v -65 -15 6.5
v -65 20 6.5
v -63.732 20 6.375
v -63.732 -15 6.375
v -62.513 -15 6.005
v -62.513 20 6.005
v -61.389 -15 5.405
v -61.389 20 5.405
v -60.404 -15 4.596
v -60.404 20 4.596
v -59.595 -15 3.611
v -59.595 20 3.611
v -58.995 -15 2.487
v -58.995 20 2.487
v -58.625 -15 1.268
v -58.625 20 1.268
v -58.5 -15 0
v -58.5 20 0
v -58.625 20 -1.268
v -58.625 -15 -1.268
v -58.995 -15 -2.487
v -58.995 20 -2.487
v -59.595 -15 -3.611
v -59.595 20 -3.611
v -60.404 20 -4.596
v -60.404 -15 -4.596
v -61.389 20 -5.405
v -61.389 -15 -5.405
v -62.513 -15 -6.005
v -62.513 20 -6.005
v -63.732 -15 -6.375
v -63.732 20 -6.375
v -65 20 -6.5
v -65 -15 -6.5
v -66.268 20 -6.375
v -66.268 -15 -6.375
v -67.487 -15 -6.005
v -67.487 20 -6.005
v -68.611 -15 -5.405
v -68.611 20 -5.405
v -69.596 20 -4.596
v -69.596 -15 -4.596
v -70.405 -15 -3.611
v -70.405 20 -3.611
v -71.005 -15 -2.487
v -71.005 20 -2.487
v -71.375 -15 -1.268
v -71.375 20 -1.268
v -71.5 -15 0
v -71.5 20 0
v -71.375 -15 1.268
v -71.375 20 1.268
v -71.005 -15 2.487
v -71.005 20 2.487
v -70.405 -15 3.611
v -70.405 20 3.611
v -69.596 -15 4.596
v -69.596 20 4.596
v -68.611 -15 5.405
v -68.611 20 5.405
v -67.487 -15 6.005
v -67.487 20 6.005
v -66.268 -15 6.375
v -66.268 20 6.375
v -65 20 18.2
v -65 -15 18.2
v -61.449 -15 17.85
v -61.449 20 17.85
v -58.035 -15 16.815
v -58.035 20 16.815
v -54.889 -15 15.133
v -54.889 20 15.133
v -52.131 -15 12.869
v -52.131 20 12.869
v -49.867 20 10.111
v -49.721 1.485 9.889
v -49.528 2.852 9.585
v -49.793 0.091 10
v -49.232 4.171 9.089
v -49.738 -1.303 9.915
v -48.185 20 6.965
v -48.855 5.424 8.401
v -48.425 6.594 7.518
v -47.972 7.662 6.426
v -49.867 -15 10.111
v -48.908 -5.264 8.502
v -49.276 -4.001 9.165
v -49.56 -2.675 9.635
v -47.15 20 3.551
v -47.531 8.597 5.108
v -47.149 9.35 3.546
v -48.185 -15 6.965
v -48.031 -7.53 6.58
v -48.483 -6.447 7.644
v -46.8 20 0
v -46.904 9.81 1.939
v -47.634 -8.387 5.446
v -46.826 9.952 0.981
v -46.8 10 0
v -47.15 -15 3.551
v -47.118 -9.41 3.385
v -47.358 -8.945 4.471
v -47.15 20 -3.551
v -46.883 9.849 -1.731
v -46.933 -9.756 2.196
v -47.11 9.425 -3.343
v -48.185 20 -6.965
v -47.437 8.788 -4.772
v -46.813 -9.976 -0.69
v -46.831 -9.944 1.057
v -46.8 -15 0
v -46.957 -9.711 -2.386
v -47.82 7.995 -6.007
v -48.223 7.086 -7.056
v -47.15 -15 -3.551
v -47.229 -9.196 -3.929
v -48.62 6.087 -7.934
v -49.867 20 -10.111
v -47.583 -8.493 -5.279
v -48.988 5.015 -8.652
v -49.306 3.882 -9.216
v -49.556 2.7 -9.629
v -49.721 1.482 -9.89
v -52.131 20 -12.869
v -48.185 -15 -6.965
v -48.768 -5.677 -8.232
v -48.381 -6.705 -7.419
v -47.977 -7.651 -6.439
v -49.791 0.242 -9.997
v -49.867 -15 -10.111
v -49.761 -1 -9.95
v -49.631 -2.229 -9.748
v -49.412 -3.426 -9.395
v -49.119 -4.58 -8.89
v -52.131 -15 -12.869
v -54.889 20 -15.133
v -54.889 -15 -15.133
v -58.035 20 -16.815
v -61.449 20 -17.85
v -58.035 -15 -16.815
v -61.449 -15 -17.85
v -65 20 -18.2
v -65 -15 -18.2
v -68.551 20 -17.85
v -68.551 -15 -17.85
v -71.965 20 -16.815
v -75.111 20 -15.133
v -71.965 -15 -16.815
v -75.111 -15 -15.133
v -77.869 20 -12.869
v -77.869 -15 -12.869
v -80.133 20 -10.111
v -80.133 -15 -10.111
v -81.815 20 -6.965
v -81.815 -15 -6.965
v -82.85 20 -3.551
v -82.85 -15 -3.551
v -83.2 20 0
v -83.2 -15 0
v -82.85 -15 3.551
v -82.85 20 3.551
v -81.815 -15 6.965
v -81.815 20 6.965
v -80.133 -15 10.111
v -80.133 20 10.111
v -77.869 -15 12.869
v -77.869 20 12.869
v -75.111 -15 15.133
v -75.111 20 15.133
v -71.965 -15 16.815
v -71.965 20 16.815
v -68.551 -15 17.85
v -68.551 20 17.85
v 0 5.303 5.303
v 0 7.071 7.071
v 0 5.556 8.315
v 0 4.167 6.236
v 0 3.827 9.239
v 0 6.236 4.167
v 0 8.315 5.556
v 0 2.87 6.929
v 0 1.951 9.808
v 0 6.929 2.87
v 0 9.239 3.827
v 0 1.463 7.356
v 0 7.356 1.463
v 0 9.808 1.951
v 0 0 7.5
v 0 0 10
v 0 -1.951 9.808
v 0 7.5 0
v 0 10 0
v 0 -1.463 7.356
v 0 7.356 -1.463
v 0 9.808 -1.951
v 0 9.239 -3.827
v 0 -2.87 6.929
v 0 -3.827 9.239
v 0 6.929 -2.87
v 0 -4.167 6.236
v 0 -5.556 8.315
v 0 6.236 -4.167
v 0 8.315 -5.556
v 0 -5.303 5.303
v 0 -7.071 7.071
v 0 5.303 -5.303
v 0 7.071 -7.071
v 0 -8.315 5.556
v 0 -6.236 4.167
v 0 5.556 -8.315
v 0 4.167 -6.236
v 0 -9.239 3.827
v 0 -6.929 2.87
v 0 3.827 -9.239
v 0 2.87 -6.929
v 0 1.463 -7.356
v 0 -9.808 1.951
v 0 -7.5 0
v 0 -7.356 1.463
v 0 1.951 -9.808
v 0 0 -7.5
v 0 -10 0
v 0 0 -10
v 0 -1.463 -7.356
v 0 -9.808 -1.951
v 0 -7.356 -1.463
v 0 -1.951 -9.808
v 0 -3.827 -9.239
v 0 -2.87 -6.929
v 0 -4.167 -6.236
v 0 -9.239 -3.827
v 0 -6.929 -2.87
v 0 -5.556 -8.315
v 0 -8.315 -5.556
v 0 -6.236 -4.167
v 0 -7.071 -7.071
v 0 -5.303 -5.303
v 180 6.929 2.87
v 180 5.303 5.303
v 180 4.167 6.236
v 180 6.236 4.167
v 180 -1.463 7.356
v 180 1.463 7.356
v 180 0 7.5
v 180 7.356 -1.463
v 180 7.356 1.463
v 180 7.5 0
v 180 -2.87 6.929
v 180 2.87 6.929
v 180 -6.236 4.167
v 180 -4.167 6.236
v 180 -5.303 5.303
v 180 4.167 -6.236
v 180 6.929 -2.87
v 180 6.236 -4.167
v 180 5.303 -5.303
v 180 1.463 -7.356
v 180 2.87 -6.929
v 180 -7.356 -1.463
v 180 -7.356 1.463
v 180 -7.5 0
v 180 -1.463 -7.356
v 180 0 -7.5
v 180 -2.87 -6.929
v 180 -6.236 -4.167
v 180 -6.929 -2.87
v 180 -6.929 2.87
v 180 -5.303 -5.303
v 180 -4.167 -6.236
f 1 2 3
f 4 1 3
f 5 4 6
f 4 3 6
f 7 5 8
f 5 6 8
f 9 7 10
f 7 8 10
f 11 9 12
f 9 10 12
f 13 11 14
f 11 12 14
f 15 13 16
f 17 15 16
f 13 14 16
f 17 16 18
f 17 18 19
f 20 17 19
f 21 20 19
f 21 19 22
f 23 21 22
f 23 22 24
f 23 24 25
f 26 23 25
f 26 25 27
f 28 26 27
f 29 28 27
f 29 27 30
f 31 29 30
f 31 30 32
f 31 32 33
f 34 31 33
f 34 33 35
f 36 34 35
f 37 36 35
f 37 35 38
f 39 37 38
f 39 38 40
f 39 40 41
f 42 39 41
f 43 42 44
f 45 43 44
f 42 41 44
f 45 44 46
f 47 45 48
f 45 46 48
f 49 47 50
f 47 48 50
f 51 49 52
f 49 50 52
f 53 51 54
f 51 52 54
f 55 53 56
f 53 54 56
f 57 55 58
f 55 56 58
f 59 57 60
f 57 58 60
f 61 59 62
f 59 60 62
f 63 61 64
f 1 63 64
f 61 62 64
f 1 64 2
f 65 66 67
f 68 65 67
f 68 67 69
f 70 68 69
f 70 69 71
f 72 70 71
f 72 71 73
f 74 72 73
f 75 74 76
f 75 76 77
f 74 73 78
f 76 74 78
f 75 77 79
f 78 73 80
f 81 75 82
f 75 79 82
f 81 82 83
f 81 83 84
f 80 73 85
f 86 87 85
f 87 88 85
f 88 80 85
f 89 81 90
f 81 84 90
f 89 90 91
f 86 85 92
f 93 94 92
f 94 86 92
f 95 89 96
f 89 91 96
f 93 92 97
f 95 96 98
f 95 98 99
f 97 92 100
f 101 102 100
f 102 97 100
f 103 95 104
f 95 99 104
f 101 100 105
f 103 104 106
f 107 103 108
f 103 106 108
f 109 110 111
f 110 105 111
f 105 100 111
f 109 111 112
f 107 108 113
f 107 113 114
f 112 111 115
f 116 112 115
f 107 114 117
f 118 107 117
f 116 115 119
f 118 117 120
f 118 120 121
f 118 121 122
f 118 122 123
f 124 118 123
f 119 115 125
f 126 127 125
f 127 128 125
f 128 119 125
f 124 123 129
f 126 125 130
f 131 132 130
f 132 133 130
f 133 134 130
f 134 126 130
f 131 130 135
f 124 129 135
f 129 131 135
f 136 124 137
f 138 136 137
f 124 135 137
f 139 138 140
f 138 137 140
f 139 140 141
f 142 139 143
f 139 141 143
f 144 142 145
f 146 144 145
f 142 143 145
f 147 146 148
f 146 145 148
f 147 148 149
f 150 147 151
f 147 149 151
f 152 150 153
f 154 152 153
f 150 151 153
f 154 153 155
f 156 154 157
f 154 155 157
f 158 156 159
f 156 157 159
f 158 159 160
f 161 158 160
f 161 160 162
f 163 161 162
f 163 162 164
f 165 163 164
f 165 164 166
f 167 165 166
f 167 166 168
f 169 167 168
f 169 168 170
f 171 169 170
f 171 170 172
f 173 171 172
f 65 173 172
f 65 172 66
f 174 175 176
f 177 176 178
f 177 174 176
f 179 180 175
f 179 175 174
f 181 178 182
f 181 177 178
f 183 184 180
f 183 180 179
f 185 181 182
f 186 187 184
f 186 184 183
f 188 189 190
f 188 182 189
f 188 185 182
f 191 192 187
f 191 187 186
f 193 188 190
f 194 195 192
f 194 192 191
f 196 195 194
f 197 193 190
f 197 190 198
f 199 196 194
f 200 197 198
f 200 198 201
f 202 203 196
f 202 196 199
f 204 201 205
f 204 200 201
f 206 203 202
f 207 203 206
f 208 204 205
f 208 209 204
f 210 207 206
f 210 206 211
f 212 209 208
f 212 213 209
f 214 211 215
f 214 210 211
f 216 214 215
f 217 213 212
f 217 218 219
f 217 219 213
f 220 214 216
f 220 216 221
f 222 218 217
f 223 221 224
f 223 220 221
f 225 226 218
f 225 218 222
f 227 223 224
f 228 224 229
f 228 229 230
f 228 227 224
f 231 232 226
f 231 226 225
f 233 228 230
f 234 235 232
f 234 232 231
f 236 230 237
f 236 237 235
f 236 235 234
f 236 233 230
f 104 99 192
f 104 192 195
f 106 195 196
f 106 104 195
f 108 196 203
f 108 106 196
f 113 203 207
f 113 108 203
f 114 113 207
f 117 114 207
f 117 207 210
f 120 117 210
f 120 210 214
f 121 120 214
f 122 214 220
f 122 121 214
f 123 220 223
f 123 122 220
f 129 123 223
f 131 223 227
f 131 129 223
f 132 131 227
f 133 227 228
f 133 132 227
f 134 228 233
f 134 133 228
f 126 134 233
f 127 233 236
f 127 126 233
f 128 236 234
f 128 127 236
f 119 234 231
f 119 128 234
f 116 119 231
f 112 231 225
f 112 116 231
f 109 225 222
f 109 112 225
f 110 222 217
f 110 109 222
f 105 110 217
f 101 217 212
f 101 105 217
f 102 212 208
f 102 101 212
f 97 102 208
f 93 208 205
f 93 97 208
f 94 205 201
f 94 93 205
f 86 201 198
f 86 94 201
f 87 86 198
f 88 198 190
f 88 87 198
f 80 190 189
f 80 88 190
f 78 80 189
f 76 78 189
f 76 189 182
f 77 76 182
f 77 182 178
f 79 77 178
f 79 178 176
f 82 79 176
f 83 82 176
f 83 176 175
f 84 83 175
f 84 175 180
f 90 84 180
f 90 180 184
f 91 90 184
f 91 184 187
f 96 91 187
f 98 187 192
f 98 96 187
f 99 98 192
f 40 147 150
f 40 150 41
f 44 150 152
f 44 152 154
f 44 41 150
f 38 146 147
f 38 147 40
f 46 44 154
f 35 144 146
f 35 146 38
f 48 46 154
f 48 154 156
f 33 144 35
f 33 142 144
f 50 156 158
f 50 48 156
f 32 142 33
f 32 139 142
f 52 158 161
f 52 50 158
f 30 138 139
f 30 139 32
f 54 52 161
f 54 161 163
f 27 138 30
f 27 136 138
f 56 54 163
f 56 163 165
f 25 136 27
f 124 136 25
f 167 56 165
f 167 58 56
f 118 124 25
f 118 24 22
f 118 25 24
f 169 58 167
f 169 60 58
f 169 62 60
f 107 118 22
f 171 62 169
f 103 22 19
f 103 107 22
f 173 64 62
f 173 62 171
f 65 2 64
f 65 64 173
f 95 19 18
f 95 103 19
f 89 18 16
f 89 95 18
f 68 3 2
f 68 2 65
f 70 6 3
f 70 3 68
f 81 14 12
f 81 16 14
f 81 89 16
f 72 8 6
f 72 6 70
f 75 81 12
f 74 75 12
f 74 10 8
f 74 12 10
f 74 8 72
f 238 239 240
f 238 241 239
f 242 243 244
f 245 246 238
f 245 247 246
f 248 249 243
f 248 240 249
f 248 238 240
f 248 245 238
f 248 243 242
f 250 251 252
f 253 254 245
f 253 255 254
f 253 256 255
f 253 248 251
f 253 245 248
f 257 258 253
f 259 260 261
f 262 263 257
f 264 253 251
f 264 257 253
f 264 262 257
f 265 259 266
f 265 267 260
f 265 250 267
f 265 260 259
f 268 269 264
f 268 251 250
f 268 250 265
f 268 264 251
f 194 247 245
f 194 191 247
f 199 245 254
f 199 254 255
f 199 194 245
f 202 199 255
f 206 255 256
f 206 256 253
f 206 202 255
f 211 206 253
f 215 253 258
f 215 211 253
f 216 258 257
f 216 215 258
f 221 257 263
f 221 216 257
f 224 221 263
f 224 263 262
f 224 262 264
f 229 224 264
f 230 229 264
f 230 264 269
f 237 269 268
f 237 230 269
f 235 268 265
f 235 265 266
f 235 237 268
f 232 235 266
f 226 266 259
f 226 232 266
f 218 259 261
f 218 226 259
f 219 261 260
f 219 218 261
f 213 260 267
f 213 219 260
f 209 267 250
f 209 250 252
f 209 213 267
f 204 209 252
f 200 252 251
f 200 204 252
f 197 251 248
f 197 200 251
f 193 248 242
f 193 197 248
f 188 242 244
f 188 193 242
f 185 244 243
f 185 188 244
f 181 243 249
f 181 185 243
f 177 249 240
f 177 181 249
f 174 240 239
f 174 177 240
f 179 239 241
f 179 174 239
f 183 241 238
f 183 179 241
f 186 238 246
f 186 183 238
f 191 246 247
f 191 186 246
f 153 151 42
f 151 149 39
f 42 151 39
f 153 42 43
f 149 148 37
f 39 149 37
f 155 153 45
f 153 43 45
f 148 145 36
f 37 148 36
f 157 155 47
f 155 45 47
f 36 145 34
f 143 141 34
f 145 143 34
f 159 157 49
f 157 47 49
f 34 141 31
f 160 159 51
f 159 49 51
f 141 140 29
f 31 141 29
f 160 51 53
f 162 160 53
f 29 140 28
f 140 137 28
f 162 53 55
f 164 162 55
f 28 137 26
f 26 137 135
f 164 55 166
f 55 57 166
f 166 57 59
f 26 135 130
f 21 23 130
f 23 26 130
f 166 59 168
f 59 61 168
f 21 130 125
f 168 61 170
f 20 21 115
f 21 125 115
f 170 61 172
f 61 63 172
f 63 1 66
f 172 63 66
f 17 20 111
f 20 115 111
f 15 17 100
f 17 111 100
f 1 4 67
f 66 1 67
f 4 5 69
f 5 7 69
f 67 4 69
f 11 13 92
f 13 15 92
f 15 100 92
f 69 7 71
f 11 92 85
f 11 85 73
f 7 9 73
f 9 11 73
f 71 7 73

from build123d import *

# Parameters (mm, degrees)
BOSS_EXTRUDE1_DEPTH      = 20
BOSS_EXTRUDE1_DEPTH_BACK = 15
SKETCH2_R                = 18.2
SKETCH3_R                = 6.5
CUT_EXTRUDE1_DEPTH       = 55


with BuildPart() as part:
    # Sketch1 → Revolve1 (revolve)
    with BuildSketch(Plane.XY):
        Polygon((0, 0), (180, 0), (180, 7.5), (0, 7.5), (0, 10), (-50, 10), (-50, 0), align=None)
    revolve(axis=Axis((0, 0, 0), (-1, 0, 0)))

    # Sketch2 → Boss-Extrude1 (add, two sides: drawn at the far end of the back side and taken through both)
    with BuildSketch(Plane(origin=(0, 0, 0), x_dir=(1, 0, 0), z_dir=(0, 1, 0)).offset(-BOSS_EXTRUDE1_DEPTH_BACK)):
        with Locations(Location((-65, 0, 0), (0, 0, 270))):
            Circle(SKETCH2_R)
    extrude(amount=BOSS_EXTRUDE1_DEPTH + BOSS_EXTRUDE1_DEPTH_BACK)

    # Sketch3 → Cut-Extrude1 (cut)
    with BuildSketch(Plane(origin=(0, 20, 0), x_dir=(1, 0, 0), z_dir=(0, 1, 0))):
        with Locations(Location((-65, 0, 0), (0, 0, 270))):
            Circle(SKETCH3_R)
    extrude(amount=-CUT_EXTRUDE1_DEPTH, mode=Mode.SUBTRACT)


solid = part.part
